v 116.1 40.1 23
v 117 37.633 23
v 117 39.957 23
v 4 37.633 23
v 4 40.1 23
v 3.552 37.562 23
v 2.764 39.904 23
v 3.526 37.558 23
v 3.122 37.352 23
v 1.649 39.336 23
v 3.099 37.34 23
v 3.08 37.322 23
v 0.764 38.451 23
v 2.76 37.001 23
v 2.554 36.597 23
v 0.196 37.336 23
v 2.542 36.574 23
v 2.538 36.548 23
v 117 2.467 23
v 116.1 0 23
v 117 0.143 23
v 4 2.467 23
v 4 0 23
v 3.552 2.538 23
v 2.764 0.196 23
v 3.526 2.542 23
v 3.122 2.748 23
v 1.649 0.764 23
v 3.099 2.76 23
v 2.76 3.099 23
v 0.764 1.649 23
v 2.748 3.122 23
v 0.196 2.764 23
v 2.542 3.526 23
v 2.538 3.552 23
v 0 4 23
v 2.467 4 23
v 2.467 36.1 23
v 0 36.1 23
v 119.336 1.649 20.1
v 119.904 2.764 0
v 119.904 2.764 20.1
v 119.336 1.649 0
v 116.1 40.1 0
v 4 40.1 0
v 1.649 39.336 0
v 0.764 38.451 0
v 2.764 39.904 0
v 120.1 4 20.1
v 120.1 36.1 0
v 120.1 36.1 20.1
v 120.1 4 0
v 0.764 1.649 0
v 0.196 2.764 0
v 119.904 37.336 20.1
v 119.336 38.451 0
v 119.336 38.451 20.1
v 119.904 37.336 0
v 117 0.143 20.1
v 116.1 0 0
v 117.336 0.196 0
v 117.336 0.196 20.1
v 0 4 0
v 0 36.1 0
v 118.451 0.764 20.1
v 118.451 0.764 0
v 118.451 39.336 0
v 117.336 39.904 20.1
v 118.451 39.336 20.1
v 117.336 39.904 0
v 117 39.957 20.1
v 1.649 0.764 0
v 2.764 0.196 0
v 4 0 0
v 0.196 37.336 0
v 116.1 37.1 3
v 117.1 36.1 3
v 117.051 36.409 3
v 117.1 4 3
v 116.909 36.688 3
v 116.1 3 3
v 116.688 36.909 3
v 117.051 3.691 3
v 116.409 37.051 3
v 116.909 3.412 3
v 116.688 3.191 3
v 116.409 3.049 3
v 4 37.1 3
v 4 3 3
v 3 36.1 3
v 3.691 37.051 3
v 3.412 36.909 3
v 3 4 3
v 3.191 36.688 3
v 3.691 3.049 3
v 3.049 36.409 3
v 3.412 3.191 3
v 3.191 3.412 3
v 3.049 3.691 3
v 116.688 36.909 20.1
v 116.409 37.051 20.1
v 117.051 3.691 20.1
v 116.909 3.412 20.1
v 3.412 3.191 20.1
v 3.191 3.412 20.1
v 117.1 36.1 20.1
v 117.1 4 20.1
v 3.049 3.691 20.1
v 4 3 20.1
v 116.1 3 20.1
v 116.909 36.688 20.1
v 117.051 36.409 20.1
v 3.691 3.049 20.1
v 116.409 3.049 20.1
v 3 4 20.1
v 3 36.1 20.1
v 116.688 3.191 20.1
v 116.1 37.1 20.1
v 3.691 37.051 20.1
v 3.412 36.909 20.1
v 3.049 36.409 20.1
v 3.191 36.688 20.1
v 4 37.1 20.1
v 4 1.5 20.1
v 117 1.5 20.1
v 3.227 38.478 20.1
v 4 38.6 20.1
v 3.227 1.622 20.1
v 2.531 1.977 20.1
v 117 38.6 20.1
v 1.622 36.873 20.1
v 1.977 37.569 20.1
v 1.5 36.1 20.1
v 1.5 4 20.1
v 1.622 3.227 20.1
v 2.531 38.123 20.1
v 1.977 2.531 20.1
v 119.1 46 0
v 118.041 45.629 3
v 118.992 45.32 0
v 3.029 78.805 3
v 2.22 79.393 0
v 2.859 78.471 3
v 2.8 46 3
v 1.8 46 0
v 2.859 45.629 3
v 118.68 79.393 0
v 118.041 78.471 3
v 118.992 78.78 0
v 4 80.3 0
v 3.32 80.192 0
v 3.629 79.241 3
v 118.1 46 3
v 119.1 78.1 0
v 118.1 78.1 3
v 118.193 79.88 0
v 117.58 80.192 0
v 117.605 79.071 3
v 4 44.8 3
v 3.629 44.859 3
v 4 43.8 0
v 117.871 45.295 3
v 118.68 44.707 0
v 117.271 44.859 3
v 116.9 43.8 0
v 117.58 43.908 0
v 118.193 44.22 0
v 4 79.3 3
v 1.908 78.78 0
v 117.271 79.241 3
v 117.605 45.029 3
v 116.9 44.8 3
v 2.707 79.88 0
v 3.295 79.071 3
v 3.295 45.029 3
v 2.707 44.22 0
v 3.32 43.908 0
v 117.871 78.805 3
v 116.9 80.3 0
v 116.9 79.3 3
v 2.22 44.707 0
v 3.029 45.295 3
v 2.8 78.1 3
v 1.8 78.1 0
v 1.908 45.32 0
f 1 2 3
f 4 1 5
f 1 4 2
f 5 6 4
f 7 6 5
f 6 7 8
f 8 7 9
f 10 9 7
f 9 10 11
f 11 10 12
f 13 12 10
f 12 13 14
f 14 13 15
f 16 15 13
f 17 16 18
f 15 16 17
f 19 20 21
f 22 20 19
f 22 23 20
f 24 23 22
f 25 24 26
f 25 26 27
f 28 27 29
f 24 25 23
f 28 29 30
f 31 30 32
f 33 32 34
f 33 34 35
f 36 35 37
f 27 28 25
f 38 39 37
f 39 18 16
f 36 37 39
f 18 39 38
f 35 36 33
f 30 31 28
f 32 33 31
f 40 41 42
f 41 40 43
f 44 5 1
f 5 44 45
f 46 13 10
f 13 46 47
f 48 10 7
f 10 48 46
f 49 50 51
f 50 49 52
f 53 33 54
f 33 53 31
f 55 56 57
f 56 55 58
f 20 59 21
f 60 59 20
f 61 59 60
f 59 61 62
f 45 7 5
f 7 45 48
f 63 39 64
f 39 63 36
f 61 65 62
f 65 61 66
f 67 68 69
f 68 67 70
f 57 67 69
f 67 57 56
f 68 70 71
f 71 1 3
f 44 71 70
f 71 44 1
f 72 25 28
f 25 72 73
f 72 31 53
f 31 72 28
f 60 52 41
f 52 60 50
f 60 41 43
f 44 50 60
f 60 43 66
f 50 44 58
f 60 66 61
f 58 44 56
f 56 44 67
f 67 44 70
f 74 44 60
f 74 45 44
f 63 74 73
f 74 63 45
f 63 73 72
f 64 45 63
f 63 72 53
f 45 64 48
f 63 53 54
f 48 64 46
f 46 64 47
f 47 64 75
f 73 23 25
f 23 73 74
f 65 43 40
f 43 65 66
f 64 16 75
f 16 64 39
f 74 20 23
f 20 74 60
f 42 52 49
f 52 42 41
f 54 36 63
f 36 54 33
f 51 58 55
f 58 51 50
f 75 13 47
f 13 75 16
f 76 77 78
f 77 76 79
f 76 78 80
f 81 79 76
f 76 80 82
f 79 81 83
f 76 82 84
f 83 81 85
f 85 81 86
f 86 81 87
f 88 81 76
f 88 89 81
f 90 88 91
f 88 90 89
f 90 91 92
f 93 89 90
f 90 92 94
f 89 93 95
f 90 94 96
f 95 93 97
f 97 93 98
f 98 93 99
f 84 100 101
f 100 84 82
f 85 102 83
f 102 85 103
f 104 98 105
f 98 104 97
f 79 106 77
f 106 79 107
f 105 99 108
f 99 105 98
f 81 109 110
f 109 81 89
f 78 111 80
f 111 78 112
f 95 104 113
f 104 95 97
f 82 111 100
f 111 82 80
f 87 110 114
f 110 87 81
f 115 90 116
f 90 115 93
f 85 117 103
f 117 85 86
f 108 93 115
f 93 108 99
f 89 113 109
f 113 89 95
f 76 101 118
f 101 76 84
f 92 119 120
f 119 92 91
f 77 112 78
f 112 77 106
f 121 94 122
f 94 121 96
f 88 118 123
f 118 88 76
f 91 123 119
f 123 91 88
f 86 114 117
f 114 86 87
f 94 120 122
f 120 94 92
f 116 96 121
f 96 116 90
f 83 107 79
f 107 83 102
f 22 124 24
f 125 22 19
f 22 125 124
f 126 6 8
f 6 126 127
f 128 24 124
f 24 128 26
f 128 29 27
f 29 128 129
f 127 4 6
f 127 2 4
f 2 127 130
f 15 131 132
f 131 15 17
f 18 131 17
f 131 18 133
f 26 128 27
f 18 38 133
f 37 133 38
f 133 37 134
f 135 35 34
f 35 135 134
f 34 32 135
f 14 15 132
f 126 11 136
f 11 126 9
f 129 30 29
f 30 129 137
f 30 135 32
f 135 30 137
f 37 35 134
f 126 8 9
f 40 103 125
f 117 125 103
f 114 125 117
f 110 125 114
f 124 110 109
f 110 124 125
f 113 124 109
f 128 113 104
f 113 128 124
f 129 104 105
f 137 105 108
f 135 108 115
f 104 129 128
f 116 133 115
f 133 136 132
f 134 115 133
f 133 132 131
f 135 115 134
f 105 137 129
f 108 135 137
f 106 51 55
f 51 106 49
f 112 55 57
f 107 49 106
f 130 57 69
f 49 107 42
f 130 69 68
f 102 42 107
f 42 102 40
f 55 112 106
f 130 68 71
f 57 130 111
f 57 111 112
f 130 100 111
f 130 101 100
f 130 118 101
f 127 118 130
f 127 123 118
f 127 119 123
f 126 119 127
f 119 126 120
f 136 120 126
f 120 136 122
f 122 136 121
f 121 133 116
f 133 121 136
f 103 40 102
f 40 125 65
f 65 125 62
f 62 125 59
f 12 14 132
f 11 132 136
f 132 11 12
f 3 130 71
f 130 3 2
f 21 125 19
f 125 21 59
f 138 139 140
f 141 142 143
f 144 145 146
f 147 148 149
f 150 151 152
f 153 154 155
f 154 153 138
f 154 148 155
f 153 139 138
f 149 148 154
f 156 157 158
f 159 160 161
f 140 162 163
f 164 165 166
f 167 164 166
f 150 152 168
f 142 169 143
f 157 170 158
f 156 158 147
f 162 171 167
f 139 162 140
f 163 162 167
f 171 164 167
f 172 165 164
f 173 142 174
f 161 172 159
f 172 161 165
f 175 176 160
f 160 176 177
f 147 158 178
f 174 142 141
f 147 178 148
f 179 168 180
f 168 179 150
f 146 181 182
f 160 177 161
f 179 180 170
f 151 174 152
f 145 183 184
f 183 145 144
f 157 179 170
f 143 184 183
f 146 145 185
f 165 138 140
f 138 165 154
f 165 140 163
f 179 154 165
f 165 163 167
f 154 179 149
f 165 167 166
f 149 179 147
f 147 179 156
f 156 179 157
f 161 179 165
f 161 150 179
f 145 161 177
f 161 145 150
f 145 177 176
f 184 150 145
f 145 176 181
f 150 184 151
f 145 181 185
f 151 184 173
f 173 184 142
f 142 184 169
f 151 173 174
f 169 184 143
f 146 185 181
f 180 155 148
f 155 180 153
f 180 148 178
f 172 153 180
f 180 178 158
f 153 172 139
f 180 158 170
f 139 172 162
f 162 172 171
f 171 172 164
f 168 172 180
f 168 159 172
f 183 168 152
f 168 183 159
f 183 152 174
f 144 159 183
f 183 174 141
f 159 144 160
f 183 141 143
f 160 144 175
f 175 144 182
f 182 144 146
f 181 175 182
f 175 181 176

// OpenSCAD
width = 40;
length = 120;
height = 20;
wall_thickness = 3;
//ensure that the edge roundness is greater than the wall thickness
edge_roundness = 4;
tolerance = 0.3;

$fn = 20;

/* [Hidden] */

//ignore!
inner_box_dimentions = [length,width,height];

difference ()
{

	hull()
	{
		addOutterCorners(0,0);
		addOutterCorners(1,0);
		addOutterCorners(0,1);
		addOutterCorners(1,1);
	}
	
	translate([0,0,wall_thickness])
	hull()
	{
		addInnerCorners(0,0);
		addInnerCorners(1,0);
		addInnerCorners(0,1);
		addInnerCorners(1,1);
	}

	translate([0,0,inner_box_dimentions[2]+0.1])
	hull()
	{
		addLidCorners(0,0);
		addLidCorners(1,0);
		addLidCorners(0,1);
		addLidCorners(1,1);
	}

	translate([inner_box_dimentions[0]-wall_thickness,0,inner_box_dimentions[2]+0.1])
	cube([wall_thickness,inner_box_dimentions[1],wall_thickness]);
}

difference ()
{
	translate([0,inner_box_dimentions[1]+2,0])
	hull()
	{
		Lid(0,0);
		Lid(1,0);
		Lid(0,1);
		Lid(1,1);
	}

	//translate([20,inner_box_dimentions[1]*1.5+2,0])
	//rotate([0,90,0]);

	
}



module addOutterCorners(x = 0, y = 0)
{
	translate([(inner_box_dimentions[0] - edge_roundness*2 + 0.1)*x,(inner_box_dimentions[1] - edge_roundness*2 +0.1)*y,0] + [edge_roundness,edge_roundness,0])

	cylinder(inner_box_dimentions[2]+wall_thickness,edge_roundness,edge_roundness);
	
	echo((inner_box_dimentions[0] - edge_roundness)*x);
	echo((inner_box_dimentions[1] - edge_roundness)*y);
}

module addInnerCorners(x = 0, y = 0)
{
	translate([(inner_box_dimentions[0] - edge_roundness*2 + 0.1)*x,(inner_box_dimentions[1] - edge_roundness*2 +0.1)*y,0] + [edge_roundness,edge_roundness,0])

	cylinder(inner_box_dimentions[2],edge_roundness-wall_thickness,edge_roundness-wall_thickness);
	
	echo((inner_box_dimentions[0] - edge_roundness)*x);
	echo((inner_box_dimentions[1] - edge_roundness)*y);
}

module addLidCorners(x = 0, y = 0)
{
	translate([(inner_box_dimentions[0] - edge_roundness*2 - 0.1 +wall_thickness)*x,(inner_box_dimentions[1] - edge_roundness*2 +0.1)*y,0] + [edge_roundness,edge_roundness,0])

	cylinder(wall_thickness,edge_roundness-wall_thickness+1.5,edge_roundness-wall_thickness+0.5);
	
	echo((inner_box_dimentions[0] - edge_roundness)*x);
	echo((inner_box_dimentions[1] - edge_roundness)*y);
}

module Lid(x = 0, y = 0)
{
	translate([(inner_box_dimentions[0] - edge_roundness*2 - 0.1 +wall_thickness-2)*x,(inner_box_dimentions[1] - edge_roundness*2 +0.1)*y,0] + [edge_roundness,edge_roundness,0])

	cylinder(wall_thickness,edge_roundness-wall_thickness+1.5-tolerance,edge_roundness-wall_thickness+0.5-tolerance);
	
	echo((inner_box_dimentions[0] - edge_roundness)*x);
	echo((inner_box_dimentions[1] - edge_roundness)*y);
}
